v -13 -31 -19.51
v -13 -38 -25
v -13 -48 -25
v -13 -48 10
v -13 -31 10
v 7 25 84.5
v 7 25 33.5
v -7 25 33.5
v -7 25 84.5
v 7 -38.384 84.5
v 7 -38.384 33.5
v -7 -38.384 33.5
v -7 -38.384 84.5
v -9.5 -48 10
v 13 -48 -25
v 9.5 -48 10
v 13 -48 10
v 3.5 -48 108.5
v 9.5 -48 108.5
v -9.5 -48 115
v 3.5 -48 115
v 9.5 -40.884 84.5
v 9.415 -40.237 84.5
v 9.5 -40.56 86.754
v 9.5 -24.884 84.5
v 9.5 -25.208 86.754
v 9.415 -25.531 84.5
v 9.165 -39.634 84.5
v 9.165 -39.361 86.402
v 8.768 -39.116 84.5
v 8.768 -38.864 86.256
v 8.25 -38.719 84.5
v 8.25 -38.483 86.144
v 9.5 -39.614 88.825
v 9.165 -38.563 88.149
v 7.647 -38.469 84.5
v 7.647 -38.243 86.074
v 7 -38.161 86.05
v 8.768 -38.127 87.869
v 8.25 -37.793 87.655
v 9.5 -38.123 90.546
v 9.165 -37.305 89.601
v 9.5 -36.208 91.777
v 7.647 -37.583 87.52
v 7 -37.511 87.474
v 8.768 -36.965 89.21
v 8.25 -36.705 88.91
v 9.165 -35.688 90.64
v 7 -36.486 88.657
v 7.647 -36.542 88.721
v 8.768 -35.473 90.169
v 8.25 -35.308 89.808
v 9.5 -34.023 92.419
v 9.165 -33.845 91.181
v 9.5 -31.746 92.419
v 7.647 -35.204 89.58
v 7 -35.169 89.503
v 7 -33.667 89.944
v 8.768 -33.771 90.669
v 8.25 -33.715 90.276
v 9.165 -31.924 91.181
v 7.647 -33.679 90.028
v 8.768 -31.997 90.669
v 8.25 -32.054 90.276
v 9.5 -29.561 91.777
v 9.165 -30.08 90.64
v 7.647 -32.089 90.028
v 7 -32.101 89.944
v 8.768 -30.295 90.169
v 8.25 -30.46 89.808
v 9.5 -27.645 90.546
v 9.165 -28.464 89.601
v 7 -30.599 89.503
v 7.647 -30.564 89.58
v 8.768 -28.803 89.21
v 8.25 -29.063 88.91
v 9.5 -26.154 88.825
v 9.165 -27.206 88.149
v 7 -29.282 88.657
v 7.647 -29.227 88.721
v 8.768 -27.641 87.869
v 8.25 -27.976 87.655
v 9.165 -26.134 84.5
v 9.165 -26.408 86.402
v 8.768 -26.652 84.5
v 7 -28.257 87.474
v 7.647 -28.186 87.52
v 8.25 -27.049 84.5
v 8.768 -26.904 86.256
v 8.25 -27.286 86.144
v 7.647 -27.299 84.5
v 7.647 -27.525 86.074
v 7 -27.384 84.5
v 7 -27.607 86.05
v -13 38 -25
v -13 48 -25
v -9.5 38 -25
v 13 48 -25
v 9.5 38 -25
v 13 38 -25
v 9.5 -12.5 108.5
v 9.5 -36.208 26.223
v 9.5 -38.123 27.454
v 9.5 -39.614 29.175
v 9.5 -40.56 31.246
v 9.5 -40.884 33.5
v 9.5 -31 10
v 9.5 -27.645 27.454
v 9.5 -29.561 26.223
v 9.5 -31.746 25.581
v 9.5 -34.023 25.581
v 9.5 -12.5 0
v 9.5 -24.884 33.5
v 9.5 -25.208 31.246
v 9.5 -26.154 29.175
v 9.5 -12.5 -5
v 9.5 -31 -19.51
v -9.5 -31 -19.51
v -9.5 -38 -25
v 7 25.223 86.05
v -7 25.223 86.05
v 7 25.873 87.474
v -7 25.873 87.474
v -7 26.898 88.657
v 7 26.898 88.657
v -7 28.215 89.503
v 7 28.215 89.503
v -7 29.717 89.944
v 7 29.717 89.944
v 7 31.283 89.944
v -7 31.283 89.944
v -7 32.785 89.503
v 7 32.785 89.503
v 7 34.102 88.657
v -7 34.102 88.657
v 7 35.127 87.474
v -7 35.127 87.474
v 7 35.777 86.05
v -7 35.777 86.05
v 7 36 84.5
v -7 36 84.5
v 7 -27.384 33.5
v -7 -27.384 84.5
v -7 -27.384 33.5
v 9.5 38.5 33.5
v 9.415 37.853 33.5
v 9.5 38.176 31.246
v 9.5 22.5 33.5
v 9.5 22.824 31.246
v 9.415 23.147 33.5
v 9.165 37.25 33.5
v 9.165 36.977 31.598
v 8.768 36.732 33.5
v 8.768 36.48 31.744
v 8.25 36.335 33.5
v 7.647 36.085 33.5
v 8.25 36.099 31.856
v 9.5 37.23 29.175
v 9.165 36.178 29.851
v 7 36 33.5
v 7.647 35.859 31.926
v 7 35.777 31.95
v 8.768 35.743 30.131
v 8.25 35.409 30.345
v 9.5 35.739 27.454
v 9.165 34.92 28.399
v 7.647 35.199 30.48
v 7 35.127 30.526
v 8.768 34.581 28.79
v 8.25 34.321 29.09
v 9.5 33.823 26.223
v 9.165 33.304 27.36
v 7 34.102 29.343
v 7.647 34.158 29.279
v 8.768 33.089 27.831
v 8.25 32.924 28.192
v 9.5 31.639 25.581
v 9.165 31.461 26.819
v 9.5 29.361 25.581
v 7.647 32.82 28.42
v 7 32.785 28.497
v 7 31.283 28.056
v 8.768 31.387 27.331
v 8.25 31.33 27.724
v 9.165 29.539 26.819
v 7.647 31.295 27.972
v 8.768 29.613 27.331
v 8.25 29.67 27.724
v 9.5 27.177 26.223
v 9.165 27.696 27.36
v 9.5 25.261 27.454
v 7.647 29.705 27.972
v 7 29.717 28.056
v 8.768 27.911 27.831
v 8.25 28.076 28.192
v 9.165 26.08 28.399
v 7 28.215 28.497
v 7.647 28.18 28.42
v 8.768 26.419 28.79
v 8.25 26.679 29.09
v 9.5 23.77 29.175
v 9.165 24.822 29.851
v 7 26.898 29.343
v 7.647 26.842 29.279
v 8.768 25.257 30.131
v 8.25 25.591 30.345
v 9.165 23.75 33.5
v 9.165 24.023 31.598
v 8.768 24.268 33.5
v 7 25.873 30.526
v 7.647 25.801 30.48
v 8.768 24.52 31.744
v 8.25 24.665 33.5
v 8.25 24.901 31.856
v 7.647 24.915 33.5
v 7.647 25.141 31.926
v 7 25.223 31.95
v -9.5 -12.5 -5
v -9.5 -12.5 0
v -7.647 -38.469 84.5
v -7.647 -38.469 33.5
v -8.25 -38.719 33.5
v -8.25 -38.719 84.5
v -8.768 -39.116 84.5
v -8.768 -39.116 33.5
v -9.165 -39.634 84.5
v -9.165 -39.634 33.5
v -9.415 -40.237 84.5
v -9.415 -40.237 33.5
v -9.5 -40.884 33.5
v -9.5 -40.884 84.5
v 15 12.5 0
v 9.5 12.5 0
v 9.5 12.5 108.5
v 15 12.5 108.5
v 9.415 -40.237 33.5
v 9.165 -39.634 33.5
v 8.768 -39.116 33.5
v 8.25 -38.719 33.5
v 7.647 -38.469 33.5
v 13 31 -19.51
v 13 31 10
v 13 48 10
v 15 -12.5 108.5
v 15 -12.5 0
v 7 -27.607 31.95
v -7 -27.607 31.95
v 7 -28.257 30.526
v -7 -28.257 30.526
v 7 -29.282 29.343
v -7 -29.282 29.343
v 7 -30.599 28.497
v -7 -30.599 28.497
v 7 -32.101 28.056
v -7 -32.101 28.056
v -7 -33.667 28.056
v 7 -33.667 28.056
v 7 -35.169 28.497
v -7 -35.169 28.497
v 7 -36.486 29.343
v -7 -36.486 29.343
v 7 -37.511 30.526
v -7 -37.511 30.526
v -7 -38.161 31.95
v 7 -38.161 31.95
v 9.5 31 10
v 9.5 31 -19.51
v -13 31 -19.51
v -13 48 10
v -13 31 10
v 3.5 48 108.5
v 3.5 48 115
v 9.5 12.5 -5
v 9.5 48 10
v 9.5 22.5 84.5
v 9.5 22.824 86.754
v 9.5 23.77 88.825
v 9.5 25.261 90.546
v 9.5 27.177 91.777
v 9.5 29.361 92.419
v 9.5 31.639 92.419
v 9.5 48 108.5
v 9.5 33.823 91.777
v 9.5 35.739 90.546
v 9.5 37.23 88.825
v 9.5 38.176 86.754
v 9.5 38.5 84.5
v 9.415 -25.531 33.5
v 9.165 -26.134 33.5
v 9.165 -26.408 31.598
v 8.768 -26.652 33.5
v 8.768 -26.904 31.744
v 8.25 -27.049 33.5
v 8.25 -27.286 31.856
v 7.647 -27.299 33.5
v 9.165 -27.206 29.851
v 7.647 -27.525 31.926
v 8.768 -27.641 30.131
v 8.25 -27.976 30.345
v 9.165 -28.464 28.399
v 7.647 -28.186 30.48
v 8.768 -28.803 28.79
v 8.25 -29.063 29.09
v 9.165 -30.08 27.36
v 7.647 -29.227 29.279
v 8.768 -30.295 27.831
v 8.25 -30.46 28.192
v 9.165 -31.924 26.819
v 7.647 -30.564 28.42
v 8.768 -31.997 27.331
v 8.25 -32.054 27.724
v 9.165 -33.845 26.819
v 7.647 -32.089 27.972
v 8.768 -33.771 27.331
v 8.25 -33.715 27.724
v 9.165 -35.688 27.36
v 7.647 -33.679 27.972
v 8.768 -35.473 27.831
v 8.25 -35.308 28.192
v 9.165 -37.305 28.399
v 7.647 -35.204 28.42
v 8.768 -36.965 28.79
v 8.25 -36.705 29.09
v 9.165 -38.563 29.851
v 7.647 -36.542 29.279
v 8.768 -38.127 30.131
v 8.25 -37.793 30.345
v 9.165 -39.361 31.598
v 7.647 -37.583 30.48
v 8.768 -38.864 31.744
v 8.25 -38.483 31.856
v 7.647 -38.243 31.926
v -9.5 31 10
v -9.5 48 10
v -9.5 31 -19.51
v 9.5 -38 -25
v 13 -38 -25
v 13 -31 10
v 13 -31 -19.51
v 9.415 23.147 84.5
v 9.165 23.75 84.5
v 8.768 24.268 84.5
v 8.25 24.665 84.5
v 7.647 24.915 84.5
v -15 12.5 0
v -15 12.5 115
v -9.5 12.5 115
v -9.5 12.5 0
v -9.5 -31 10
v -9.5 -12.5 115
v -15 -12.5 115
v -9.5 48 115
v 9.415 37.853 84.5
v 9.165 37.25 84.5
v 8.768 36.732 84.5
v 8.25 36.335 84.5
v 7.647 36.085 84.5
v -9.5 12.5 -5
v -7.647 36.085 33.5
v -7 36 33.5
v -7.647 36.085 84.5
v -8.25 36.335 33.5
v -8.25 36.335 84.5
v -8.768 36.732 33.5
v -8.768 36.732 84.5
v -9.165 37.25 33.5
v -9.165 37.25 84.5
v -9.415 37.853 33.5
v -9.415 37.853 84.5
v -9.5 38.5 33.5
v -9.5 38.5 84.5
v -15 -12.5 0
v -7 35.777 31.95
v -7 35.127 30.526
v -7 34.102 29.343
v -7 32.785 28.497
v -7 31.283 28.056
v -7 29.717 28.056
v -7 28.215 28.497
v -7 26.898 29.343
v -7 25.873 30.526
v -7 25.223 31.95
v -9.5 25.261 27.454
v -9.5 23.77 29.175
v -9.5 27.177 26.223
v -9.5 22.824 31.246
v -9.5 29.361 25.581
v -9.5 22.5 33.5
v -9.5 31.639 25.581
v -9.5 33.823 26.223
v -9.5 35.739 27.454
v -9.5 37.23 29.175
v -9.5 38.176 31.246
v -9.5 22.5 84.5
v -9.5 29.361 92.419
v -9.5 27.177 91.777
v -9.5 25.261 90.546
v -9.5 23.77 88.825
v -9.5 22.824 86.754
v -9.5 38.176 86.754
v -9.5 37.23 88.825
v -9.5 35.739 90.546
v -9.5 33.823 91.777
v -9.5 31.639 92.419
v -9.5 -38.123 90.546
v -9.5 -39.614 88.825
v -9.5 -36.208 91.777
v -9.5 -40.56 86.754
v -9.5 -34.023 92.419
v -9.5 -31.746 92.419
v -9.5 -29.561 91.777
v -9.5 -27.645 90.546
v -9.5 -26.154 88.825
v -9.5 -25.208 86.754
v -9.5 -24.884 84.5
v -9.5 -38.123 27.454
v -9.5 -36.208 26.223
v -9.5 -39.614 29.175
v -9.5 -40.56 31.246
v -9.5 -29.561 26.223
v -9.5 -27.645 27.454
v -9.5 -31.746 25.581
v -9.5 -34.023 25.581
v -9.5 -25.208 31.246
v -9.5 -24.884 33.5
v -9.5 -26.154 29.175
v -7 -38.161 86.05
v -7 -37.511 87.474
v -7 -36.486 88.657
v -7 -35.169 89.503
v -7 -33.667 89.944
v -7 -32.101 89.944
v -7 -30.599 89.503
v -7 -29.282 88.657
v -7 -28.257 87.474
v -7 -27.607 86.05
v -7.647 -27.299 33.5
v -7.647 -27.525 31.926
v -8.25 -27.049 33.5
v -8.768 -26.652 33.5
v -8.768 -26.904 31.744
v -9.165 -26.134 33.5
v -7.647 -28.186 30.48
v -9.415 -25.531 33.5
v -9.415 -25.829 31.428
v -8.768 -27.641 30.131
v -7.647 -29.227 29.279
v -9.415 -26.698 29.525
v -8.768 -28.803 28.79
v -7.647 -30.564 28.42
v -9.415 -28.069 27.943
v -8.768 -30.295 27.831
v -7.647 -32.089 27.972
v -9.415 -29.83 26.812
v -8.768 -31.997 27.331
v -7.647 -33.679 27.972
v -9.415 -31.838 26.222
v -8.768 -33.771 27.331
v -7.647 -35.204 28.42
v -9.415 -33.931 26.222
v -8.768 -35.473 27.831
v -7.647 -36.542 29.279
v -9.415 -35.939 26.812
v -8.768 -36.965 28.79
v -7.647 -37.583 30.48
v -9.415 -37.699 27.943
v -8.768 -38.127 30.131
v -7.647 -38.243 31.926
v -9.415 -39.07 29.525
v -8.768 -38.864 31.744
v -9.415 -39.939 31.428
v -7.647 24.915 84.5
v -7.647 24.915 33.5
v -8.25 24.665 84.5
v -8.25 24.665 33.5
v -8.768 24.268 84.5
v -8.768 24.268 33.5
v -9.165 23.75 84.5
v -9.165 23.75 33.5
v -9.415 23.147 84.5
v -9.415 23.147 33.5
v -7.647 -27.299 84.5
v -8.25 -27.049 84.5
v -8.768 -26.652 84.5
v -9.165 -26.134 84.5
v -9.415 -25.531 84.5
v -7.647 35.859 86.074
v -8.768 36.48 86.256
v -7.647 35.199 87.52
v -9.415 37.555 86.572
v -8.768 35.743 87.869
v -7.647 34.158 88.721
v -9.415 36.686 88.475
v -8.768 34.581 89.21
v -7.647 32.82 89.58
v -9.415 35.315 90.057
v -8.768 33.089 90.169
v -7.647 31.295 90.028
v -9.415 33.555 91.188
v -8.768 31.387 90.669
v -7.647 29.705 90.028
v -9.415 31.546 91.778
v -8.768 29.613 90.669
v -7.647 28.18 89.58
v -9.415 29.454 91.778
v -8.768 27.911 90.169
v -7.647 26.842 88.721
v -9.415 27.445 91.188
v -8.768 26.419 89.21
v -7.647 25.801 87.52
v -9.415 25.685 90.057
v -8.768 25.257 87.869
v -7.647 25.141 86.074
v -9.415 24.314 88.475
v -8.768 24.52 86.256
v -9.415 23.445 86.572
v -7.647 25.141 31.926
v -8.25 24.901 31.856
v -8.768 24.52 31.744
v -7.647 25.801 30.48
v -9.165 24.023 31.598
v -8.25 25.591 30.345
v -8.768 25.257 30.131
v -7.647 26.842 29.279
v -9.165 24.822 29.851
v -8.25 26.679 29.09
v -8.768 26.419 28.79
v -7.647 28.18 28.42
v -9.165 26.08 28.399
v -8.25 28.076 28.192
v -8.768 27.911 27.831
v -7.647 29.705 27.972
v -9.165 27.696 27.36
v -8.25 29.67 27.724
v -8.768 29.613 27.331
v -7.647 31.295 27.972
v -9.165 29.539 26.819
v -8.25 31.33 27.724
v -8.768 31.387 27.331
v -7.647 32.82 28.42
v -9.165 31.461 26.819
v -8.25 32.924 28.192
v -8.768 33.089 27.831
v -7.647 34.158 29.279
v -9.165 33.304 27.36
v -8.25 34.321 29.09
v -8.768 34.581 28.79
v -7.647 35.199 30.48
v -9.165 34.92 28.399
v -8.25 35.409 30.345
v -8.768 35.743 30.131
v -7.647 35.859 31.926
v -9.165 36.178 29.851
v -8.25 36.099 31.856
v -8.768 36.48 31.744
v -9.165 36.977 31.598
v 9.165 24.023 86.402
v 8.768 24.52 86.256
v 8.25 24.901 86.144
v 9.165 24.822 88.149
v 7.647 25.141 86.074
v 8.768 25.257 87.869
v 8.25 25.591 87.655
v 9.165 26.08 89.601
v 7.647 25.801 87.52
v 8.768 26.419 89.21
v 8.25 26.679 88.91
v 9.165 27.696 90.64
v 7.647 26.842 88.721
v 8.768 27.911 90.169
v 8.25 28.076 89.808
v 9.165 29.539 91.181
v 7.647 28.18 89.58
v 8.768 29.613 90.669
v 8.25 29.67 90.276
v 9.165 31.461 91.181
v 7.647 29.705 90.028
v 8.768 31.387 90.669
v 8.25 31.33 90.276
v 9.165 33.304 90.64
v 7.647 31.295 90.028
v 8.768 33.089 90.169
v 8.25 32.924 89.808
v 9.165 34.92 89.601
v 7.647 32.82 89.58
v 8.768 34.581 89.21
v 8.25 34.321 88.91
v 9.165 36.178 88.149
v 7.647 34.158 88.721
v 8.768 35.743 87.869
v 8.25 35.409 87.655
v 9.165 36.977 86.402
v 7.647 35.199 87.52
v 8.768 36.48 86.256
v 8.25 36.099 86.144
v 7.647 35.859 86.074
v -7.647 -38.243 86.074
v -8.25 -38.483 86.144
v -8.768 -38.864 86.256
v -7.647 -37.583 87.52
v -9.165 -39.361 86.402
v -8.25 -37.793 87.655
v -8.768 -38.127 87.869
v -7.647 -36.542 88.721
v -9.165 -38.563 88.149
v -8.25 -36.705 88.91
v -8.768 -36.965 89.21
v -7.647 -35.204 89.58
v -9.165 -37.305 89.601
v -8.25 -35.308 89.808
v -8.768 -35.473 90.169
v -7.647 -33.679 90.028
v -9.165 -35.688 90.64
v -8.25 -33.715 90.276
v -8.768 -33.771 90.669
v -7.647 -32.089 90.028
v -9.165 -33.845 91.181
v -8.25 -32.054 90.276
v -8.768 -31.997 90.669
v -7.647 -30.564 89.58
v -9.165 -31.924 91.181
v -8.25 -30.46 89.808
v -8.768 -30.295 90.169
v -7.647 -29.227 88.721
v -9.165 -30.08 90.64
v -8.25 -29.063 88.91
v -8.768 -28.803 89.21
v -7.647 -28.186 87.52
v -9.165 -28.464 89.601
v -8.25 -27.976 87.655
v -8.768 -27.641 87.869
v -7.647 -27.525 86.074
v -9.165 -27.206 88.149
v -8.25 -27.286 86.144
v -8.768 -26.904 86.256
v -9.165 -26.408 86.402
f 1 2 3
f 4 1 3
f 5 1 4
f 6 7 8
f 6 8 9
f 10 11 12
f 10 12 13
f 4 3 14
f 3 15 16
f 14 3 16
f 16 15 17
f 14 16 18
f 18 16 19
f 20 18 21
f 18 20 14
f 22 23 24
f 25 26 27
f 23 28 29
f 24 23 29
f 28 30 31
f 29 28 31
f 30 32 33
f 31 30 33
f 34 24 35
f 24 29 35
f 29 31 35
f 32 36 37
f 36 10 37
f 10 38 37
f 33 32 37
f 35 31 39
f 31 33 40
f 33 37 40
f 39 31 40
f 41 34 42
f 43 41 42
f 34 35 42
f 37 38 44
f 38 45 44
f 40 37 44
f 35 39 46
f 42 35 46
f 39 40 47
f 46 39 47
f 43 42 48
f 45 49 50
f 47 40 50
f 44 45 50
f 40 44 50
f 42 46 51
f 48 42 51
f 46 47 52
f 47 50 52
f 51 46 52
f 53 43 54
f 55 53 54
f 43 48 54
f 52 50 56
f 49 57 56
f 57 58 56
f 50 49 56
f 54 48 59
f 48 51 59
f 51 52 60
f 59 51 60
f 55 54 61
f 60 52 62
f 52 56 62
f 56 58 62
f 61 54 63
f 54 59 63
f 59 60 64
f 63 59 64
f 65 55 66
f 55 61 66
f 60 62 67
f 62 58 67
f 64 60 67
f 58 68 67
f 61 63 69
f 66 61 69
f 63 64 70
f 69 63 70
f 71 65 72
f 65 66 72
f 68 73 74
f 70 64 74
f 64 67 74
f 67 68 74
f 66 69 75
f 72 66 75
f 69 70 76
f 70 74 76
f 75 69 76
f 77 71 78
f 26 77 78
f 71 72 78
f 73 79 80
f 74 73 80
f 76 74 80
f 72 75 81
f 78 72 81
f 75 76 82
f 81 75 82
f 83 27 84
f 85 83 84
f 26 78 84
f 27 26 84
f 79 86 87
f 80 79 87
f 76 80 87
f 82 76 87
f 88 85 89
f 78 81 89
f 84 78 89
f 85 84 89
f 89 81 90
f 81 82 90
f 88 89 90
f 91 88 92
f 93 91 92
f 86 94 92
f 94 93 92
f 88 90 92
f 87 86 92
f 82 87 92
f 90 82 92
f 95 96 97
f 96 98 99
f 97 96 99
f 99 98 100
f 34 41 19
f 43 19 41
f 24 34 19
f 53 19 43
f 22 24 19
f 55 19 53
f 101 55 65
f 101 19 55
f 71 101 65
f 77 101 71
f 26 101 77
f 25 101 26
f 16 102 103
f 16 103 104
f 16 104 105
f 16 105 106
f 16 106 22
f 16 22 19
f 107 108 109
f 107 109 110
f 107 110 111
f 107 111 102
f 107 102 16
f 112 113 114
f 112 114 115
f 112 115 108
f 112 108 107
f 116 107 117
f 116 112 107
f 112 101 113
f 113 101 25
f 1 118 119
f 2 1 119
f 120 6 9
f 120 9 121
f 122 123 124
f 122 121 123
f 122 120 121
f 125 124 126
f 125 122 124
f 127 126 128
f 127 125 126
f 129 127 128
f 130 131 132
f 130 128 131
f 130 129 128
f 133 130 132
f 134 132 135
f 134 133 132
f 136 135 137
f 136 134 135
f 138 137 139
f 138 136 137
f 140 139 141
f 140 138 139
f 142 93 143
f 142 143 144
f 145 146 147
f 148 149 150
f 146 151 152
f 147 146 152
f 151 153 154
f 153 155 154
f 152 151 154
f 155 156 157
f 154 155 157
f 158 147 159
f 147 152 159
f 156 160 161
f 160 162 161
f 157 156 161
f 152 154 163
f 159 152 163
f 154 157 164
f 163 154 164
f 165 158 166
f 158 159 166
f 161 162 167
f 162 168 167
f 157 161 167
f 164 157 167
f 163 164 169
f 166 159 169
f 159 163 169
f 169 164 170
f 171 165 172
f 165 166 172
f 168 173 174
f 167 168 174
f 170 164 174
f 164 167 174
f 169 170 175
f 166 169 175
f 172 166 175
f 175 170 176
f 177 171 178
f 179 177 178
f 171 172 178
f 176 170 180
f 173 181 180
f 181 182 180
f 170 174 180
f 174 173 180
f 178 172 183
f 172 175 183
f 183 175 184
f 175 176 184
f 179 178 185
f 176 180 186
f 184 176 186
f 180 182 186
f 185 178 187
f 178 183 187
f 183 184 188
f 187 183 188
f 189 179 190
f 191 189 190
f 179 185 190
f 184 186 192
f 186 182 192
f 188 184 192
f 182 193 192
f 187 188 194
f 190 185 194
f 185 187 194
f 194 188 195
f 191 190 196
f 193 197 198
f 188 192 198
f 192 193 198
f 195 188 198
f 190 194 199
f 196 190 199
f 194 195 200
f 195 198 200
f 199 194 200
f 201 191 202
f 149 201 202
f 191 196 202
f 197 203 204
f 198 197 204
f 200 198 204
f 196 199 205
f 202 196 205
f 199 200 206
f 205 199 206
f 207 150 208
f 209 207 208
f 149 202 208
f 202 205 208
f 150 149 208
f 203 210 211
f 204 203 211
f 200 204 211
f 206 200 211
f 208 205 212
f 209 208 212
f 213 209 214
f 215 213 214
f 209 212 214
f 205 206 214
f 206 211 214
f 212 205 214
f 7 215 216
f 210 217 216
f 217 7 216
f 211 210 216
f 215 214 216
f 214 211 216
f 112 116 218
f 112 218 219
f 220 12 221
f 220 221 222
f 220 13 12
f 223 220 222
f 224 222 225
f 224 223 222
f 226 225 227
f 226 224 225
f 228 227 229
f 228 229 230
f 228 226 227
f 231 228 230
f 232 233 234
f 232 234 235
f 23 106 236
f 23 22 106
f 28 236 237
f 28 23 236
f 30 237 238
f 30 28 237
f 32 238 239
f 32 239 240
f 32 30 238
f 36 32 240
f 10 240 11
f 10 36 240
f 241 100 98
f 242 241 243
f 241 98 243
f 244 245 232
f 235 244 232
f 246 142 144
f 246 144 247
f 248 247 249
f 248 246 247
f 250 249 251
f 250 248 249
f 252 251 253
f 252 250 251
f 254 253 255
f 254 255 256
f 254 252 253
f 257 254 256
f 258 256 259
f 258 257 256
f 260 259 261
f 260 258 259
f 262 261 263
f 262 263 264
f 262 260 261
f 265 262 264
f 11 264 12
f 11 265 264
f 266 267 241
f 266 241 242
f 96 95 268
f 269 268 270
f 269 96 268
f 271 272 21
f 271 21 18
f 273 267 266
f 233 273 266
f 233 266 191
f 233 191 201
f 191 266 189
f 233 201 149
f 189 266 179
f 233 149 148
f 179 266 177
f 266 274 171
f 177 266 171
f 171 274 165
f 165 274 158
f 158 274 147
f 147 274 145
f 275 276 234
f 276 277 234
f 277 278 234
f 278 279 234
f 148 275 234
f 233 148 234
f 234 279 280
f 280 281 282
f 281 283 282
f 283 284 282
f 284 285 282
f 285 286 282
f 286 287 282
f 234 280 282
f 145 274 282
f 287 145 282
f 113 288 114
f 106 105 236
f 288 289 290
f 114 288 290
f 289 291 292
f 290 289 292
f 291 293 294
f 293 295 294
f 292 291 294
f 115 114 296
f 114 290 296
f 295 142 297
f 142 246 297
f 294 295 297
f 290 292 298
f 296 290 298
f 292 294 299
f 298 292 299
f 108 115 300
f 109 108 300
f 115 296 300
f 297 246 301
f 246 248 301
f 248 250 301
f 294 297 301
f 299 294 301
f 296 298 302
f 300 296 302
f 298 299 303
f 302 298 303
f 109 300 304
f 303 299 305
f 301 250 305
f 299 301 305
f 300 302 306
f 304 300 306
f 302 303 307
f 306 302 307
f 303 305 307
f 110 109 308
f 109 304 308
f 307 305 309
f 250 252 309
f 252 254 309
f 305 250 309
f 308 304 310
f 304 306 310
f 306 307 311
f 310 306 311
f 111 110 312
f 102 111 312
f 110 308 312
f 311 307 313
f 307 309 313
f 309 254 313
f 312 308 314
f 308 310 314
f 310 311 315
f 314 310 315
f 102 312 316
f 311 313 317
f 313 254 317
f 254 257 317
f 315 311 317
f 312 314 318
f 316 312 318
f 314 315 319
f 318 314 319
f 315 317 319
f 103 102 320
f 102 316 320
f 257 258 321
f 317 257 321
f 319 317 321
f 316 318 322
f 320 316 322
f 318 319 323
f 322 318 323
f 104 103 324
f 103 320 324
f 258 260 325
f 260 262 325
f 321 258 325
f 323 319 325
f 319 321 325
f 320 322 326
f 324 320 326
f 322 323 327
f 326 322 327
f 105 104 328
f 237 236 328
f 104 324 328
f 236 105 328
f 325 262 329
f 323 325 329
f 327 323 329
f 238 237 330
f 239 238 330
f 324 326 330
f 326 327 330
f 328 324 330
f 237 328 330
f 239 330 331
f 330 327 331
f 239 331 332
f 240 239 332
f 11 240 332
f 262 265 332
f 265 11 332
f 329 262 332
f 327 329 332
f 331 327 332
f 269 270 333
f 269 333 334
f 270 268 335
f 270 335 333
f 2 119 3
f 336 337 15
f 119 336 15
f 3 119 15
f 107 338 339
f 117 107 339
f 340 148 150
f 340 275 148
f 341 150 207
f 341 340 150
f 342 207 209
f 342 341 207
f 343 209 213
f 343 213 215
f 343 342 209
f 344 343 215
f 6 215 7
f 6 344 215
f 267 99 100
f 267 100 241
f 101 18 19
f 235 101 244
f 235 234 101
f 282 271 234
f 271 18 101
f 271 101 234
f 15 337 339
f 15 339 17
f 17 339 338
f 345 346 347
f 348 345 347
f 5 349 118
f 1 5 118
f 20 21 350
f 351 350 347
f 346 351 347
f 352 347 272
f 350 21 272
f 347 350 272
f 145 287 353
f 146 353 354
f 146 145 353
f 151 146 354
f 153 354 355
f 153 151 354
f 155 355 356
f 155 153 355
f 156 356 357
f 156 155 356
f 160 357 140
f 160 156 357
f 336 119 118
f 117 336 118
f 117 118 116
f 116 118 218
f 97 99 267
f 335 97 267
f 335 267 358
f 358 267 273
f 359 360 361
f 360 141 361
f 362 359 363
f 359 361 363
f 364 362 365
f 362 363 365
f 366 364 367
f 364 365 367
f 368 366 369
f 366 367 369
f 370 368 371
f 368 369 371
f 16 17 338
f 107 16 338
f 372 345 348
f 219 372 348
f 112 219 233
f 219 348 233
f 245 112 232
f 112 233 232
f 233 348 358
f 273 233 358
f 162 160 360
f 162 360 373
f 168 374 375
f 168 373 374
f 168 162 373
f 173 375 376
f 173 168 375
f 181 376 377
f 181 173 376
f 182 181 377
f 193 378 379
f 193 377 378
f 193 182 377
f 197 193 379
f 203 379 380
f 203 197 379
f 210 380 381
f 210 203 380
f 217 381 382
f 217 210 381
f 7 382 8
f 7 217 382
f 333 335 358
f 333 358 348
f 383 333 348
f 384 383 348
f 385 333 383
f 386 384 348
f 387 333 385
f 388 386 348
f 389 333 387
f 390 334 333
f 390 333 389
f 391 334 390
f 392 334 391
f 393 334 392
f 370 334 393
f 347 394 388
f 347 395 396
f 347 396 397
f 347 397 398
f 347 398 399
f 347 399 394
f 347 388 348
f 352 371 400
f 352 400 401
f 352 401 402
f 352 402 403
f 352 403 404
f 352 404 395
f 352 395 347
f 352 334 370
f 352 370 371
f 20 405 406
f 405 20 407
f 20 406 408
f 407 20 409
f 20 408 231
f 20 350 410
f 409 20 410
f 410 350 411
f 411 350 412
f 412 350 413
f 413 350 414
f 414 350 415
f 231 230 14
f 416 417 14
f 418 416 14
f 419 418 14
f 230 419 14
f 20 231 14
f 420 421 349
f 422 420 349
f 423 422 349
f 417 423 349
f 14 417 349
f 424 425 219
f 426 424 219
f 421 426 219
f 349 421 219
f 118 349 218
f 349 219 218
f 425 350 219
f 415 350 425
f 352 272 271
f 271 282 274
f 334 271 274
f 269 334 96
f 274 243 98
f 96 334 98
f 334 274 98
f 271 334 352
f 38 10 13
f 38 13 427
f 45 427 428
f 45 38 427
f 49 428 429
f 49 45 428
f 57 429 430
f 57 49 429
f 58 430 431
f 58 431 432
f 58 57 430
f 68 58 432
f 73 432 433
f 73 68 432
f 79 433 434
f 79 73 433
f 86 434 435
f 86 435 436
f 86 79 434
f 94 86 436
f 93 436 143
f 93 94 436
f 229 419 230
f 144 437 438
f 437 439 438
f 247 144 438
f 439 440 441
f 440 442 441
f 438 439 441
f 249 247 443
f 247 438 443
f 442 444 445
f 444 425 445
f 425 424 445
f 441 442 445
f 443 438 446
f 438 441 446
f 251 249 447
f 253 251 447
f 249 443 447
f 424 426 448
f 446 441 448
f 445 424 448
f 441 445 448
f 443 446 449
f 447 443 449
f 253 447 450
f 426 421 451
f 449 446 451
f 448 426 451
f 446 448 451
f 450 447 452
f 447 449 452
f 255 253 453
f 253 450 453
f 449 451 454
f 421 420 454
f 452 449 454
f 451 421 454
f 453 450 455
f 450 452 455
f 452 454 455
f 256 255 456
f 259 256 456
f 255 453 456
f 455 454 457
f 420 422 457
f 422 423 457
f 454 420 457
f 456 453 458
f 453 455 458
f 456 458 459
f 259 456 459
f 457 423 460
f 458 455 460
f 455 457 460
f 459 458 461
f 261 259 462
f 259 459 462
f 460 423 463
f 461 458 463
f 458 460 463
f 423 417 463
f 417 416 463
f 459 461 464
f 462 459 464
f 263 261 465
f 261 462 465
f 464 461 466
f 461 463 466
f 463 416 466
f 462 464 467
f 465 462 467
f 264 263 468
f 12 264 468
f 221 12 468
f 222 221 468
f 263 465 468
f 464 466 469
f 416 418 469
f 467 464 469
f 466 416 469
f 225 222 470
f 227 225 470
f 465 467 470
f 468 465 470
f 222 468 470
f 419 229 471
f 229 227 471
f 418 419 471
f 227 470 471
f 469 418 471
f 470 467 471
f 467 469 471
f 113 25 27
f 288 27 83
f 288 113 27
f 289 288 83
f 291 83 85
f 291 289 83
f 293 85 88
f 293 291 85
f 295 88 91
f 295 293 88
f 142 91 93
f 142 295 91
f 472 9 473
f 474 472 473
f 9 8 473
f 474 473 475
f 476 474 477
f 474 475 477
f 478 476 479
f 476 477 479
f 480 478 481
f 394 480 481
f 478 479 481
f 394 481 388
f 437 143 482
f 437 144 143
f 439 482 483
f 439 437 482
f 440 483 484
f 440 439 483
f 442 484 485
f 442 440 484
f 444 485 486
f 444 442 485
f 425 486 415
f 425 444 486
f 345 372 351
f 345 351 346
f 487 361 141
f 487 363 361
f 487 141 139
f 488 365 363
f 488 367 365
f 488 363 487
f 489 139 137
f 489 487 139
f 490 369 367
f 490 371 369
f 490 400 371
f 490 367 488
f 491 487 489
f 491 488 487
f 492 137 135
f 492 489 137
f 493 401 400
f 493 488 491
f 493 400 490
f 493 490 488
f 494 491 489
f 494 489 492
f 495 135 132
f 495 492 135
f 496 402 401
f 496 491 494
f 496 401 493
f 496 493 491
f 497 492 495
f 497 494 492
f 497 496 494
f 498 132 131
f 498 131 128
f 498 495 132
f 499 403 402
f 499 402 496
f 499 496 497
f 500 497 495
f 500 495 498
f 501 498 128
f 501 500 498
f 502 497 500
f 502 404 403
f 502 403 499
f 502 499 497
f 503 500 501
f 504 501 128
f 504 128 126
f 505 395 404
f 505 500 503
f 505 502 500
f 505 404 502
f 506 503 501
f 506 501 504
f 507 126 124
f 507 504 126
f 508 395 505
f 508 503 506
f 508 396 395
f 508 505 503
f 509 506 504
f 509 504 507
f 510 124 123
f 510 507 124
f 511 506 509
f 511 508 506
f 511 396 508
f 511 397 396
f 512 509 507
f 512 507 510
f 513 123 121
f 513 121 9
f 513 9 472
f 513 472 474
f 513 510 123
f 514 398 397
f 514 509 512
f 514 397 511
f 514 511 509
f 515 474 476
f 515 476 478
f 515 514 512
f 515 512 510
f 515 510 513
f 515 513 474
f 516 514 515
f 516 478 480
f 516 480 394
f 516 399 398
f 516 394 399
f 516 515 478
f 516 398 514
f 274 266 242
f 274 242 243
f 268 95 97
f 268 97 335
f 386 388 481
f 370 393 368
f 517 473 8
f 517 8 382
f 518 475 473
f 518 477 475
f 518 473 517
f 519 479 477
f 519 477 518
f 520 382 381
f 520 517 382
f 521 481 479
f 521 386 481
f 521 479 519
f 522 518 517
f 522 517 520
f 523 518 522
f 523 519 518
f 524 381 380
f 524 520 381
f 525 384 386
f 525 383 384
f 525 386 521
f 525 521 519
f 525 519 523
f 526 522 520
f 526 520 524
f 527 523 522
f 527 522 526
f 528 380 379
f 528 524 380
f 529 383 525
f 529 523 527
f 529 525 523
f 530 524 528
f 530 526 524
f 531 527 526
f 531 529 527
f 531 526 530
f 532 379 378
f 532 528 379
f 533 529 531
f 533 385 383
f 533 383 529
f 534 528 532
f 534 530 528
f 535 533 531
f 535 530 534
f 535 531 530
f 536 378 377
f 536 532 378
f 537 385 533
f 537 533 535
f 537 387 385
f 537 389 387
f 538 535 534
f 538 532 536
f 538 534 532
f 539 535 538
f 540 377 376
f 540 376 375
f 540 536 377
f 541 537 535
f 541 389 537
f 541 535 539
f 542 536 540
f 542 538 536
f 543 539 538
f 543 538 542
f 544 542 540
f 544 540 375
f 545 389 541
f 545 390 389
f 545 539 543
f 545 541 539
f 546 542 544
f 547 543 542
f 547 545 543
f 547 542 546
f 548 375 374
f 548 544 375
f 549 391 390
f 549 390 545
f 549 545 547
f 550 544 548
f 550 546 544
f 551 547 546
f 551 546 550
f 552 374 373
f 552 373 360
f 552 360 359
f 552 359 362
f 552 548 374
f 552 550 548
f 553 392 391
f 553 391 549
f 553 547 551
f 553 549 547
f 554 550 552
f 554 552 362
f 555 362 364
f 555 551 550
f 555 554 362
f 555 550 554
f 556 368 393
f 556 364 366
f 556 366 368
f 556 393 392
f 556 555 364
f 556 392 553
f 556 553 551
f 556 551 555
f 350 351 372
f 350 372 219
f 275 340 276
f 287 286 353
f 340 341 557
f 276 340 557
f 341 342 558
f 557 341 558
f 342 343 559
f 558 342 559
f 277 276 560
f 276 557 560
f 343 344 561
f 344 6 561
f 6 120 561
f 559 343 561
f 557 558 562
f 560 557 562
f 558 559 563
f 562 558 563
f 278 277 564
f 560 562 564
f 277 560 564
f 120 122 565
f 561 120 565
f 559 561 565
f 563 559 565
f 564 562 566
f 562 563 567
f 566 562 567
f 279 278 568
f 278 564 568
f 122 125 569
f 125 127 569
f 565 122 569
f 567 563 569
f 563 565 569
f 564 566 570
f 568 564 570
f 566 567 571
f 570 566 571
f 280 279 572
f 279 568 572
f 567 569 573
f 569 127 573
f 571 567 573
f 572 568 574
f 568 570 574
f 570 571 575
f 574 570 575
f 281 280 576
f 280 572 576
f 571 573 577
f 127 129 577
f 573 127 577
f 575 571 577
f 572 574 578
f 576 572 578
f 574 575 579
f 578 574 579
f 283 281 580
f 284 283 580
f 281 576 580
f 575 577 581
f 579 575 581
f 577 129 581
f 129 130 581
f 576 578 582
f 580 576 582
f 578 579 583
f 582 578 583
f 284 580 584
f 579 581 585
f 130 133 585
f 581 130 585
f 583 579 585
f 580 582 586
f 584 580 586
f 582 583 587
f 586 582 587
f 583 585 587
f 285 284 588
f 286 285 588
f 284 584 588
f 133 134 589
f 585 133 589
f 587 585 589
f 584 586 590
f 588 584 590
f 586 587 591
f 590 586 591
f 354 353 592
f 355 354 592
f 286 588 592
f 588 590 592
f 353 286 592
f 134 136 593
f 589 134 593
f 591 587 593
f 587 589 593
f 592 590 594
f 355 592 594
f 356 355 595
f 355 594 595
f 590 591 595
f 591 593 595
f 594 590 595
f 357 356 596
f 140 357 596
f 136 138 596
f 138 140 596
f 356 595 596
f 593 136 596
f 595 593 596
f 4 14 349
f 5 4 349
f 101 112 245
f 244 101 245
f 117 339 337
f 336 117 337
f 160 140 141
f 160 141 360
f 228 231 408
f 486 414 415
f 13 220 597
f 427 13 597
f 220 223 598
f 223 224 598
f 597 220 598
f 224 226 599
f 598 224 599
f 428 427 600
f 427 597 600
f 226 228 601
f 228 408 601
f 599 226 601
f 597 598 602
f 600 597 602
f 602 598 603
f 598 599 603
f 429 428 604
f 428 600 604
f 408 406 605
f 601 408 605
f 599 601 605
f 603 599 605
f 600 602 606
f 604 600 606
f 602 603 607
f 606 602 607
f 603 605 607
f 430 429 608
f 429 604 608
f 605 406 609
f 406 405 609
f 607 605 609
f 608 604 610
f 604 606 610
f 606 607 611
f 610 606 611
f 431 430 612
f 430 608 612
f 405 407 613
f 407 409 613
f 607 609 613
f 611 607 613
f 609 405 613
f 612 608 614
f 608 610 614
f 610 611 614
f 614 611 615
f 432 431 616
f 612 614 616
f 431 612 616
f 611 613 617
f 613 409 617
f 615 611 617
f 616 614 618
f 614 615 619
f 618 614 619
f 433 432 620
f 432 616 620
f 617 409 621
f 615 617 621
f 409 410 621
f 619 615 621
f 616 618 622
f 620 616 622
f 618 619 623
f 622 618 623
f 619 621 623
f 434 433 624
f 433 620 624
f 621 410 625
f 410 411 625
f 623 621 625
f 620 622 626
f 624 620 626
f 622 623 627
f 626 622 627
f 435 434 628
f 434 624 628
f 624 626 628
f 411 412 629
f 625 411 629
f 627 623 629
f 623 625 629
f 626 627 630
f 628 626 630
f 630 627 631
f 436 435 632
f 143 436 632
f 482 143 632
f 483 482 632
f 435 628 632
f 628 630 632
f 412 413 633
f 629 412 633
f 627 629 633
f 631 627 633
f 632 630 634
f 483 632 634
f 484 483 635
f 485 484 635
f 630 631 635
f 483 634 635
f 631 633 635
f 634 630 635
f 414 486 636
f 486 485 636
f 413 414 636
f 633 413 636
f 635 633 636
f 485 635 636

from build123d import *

# Parameters (mm, degrees)
SKETCH1_W           = 30
SKETCH1_H           = 25
BOSS_EXTRUDE1_DEPTH = 115
BOSS_EXTRUDE2_DEPTH = 9.5
SKETCH4_W           = 11.5
SKETCH4_H           = 6.5
CUT_EXTRUDE1_DEPTH  = 151.552316488
BOSS_EXTRUDE3_DEPTH = 13
CUT_EXTRUDE2_DEPTH  = 128.000984248
FILLET1_R           = 2.5
FILLET2_R           = 2.5


with BuildPart() as part:
    # Sketch1 → Boss-Extrude1 (new body)
    with BuildSketch(Plane.XY):
        Rectangle(SKETCH1_W, SKETCH1_H)
    extrude(amount=BOSS_EXTRUDE1_DEPTH)

    # Sketch3 → Boss-Extrude2 (add, symmetric)
    with BuildSketch(Plane(origin=(0, 0, 0), x_dir=(0, 0, -1), z_dir=(1, 0, 0))):
        Polygon((5, -12.5), (0, -12.5), (-115, -12.5), (-115, -48), (25, -48), (25, -38), align=None)
        Polygon((-115, 48), (25, 48), (25, 38), (5, 12.5), (0, 12.5), (-115, 12.5), align=None)
    extrude(amount=BOSS_EXTRUDE2_DEPTH, both=True)

    # Sketch4 → Cut-Extrude1 (cut, through all)
    with BuildSketch(Plane(origin=(0, 48, 0), x_dir=(1, 0, 0), z_dir=(0, 1, 0))):
        with Locations((9.25, -111.75)):
            Rectangle(SKETCH4_W, SKETCH4_H)
    extrude(amount=-CUT_EXTRUDE1_DEPTH, mode=Mode.SUBTRACT)

    # Sketch6 → Boss-Extrude3 (add, symmetric)
    with BuildSketch(Plane(origin=(0, 0, 0), x_dir=(0, 0, -1), z_dir=(1, 0, 0))):
        Polygon((-10, 48), (25, 48), (25, 38), (19.509803922, 31), (-10, 31), align=None)
        Polygon((25, -48), (-10, -48), (-10, -31), (19.509803922, -31), (25, -38), align=None)
    extrude(amount=BOSS_EXTRUDE3_DEPTH, both=True)

    # Sketch7 → Cut-Extrude2 (cut, through all)
    with BuildSketch(Plane(origin=(9.5, 0, 0), x_dir=(0, 0, -1), z_dir=(1, 0, 0))):
        with BuildLine():
            Line((-84.5, 36), (-33.5, 36))
            ThreePointArc((-33.5, 36), (-28, 30.5), (-33.5, 25))
            Line((-33.5, 25), (-84.5, 25))
            ThreePointArc((-84.5, 25), (-90, 30.5), (-84.5, 36))
        make_face()
        with BuildLine():
            Line((-84.5, -27.384190741), (-33.5, -27.384190741))
            ThreePointArc((-33.5, -27.384190741), (-28, -32.884190741), (-33.5, -38.384190741))
            Line((-33.5, -38.384190741), (-84.5, -38.384190741))
            ThreePointArc((-84.5, -38.384190741), (-90, -32.884190741), (-84.5, -27.384190741))
        make_face()
    extrude(amount=-CUT_EXTRUDE2_DEPTH, mode=Mode.SUBTRACT)

    # Fillet1
    fillet1_edges = [part.edges().sort_by_distance(p)[0] for p in [
        (9.5, 30.5, 90),
        (9.5, 25, 59),
        (9.5, 30.5, 28),
        (9.5, 36, 59),
    ]]
    fillet(fillet1_edges, radius=FILLET1_R)

    # Fillet2
    fillet2_edges = [part.edges().sort_by_distance(p)[0] for p in [
        (-9.5, 25, 59),
        (-9.5, 30.5, 28),
        (-9.5, 36, 59),
        (-9.5, 30.5, 90),
        (-9.5, -38.384190741, 59),
        (-9.5, -32.884190741, 28),
        (-9.5, -27.384190741, 59),
        (-9.5, -32.884190741, 90),
        (9.5, -32.884190741, 90),
        (9.5, -38.384190741, 59),
        (9.5, -32.884190741, 28),
        (9.5, -27.384190741, 59),
    ]]
    fillet(fillet2_edges, radius=FILLET2_R)


solid = part.part
